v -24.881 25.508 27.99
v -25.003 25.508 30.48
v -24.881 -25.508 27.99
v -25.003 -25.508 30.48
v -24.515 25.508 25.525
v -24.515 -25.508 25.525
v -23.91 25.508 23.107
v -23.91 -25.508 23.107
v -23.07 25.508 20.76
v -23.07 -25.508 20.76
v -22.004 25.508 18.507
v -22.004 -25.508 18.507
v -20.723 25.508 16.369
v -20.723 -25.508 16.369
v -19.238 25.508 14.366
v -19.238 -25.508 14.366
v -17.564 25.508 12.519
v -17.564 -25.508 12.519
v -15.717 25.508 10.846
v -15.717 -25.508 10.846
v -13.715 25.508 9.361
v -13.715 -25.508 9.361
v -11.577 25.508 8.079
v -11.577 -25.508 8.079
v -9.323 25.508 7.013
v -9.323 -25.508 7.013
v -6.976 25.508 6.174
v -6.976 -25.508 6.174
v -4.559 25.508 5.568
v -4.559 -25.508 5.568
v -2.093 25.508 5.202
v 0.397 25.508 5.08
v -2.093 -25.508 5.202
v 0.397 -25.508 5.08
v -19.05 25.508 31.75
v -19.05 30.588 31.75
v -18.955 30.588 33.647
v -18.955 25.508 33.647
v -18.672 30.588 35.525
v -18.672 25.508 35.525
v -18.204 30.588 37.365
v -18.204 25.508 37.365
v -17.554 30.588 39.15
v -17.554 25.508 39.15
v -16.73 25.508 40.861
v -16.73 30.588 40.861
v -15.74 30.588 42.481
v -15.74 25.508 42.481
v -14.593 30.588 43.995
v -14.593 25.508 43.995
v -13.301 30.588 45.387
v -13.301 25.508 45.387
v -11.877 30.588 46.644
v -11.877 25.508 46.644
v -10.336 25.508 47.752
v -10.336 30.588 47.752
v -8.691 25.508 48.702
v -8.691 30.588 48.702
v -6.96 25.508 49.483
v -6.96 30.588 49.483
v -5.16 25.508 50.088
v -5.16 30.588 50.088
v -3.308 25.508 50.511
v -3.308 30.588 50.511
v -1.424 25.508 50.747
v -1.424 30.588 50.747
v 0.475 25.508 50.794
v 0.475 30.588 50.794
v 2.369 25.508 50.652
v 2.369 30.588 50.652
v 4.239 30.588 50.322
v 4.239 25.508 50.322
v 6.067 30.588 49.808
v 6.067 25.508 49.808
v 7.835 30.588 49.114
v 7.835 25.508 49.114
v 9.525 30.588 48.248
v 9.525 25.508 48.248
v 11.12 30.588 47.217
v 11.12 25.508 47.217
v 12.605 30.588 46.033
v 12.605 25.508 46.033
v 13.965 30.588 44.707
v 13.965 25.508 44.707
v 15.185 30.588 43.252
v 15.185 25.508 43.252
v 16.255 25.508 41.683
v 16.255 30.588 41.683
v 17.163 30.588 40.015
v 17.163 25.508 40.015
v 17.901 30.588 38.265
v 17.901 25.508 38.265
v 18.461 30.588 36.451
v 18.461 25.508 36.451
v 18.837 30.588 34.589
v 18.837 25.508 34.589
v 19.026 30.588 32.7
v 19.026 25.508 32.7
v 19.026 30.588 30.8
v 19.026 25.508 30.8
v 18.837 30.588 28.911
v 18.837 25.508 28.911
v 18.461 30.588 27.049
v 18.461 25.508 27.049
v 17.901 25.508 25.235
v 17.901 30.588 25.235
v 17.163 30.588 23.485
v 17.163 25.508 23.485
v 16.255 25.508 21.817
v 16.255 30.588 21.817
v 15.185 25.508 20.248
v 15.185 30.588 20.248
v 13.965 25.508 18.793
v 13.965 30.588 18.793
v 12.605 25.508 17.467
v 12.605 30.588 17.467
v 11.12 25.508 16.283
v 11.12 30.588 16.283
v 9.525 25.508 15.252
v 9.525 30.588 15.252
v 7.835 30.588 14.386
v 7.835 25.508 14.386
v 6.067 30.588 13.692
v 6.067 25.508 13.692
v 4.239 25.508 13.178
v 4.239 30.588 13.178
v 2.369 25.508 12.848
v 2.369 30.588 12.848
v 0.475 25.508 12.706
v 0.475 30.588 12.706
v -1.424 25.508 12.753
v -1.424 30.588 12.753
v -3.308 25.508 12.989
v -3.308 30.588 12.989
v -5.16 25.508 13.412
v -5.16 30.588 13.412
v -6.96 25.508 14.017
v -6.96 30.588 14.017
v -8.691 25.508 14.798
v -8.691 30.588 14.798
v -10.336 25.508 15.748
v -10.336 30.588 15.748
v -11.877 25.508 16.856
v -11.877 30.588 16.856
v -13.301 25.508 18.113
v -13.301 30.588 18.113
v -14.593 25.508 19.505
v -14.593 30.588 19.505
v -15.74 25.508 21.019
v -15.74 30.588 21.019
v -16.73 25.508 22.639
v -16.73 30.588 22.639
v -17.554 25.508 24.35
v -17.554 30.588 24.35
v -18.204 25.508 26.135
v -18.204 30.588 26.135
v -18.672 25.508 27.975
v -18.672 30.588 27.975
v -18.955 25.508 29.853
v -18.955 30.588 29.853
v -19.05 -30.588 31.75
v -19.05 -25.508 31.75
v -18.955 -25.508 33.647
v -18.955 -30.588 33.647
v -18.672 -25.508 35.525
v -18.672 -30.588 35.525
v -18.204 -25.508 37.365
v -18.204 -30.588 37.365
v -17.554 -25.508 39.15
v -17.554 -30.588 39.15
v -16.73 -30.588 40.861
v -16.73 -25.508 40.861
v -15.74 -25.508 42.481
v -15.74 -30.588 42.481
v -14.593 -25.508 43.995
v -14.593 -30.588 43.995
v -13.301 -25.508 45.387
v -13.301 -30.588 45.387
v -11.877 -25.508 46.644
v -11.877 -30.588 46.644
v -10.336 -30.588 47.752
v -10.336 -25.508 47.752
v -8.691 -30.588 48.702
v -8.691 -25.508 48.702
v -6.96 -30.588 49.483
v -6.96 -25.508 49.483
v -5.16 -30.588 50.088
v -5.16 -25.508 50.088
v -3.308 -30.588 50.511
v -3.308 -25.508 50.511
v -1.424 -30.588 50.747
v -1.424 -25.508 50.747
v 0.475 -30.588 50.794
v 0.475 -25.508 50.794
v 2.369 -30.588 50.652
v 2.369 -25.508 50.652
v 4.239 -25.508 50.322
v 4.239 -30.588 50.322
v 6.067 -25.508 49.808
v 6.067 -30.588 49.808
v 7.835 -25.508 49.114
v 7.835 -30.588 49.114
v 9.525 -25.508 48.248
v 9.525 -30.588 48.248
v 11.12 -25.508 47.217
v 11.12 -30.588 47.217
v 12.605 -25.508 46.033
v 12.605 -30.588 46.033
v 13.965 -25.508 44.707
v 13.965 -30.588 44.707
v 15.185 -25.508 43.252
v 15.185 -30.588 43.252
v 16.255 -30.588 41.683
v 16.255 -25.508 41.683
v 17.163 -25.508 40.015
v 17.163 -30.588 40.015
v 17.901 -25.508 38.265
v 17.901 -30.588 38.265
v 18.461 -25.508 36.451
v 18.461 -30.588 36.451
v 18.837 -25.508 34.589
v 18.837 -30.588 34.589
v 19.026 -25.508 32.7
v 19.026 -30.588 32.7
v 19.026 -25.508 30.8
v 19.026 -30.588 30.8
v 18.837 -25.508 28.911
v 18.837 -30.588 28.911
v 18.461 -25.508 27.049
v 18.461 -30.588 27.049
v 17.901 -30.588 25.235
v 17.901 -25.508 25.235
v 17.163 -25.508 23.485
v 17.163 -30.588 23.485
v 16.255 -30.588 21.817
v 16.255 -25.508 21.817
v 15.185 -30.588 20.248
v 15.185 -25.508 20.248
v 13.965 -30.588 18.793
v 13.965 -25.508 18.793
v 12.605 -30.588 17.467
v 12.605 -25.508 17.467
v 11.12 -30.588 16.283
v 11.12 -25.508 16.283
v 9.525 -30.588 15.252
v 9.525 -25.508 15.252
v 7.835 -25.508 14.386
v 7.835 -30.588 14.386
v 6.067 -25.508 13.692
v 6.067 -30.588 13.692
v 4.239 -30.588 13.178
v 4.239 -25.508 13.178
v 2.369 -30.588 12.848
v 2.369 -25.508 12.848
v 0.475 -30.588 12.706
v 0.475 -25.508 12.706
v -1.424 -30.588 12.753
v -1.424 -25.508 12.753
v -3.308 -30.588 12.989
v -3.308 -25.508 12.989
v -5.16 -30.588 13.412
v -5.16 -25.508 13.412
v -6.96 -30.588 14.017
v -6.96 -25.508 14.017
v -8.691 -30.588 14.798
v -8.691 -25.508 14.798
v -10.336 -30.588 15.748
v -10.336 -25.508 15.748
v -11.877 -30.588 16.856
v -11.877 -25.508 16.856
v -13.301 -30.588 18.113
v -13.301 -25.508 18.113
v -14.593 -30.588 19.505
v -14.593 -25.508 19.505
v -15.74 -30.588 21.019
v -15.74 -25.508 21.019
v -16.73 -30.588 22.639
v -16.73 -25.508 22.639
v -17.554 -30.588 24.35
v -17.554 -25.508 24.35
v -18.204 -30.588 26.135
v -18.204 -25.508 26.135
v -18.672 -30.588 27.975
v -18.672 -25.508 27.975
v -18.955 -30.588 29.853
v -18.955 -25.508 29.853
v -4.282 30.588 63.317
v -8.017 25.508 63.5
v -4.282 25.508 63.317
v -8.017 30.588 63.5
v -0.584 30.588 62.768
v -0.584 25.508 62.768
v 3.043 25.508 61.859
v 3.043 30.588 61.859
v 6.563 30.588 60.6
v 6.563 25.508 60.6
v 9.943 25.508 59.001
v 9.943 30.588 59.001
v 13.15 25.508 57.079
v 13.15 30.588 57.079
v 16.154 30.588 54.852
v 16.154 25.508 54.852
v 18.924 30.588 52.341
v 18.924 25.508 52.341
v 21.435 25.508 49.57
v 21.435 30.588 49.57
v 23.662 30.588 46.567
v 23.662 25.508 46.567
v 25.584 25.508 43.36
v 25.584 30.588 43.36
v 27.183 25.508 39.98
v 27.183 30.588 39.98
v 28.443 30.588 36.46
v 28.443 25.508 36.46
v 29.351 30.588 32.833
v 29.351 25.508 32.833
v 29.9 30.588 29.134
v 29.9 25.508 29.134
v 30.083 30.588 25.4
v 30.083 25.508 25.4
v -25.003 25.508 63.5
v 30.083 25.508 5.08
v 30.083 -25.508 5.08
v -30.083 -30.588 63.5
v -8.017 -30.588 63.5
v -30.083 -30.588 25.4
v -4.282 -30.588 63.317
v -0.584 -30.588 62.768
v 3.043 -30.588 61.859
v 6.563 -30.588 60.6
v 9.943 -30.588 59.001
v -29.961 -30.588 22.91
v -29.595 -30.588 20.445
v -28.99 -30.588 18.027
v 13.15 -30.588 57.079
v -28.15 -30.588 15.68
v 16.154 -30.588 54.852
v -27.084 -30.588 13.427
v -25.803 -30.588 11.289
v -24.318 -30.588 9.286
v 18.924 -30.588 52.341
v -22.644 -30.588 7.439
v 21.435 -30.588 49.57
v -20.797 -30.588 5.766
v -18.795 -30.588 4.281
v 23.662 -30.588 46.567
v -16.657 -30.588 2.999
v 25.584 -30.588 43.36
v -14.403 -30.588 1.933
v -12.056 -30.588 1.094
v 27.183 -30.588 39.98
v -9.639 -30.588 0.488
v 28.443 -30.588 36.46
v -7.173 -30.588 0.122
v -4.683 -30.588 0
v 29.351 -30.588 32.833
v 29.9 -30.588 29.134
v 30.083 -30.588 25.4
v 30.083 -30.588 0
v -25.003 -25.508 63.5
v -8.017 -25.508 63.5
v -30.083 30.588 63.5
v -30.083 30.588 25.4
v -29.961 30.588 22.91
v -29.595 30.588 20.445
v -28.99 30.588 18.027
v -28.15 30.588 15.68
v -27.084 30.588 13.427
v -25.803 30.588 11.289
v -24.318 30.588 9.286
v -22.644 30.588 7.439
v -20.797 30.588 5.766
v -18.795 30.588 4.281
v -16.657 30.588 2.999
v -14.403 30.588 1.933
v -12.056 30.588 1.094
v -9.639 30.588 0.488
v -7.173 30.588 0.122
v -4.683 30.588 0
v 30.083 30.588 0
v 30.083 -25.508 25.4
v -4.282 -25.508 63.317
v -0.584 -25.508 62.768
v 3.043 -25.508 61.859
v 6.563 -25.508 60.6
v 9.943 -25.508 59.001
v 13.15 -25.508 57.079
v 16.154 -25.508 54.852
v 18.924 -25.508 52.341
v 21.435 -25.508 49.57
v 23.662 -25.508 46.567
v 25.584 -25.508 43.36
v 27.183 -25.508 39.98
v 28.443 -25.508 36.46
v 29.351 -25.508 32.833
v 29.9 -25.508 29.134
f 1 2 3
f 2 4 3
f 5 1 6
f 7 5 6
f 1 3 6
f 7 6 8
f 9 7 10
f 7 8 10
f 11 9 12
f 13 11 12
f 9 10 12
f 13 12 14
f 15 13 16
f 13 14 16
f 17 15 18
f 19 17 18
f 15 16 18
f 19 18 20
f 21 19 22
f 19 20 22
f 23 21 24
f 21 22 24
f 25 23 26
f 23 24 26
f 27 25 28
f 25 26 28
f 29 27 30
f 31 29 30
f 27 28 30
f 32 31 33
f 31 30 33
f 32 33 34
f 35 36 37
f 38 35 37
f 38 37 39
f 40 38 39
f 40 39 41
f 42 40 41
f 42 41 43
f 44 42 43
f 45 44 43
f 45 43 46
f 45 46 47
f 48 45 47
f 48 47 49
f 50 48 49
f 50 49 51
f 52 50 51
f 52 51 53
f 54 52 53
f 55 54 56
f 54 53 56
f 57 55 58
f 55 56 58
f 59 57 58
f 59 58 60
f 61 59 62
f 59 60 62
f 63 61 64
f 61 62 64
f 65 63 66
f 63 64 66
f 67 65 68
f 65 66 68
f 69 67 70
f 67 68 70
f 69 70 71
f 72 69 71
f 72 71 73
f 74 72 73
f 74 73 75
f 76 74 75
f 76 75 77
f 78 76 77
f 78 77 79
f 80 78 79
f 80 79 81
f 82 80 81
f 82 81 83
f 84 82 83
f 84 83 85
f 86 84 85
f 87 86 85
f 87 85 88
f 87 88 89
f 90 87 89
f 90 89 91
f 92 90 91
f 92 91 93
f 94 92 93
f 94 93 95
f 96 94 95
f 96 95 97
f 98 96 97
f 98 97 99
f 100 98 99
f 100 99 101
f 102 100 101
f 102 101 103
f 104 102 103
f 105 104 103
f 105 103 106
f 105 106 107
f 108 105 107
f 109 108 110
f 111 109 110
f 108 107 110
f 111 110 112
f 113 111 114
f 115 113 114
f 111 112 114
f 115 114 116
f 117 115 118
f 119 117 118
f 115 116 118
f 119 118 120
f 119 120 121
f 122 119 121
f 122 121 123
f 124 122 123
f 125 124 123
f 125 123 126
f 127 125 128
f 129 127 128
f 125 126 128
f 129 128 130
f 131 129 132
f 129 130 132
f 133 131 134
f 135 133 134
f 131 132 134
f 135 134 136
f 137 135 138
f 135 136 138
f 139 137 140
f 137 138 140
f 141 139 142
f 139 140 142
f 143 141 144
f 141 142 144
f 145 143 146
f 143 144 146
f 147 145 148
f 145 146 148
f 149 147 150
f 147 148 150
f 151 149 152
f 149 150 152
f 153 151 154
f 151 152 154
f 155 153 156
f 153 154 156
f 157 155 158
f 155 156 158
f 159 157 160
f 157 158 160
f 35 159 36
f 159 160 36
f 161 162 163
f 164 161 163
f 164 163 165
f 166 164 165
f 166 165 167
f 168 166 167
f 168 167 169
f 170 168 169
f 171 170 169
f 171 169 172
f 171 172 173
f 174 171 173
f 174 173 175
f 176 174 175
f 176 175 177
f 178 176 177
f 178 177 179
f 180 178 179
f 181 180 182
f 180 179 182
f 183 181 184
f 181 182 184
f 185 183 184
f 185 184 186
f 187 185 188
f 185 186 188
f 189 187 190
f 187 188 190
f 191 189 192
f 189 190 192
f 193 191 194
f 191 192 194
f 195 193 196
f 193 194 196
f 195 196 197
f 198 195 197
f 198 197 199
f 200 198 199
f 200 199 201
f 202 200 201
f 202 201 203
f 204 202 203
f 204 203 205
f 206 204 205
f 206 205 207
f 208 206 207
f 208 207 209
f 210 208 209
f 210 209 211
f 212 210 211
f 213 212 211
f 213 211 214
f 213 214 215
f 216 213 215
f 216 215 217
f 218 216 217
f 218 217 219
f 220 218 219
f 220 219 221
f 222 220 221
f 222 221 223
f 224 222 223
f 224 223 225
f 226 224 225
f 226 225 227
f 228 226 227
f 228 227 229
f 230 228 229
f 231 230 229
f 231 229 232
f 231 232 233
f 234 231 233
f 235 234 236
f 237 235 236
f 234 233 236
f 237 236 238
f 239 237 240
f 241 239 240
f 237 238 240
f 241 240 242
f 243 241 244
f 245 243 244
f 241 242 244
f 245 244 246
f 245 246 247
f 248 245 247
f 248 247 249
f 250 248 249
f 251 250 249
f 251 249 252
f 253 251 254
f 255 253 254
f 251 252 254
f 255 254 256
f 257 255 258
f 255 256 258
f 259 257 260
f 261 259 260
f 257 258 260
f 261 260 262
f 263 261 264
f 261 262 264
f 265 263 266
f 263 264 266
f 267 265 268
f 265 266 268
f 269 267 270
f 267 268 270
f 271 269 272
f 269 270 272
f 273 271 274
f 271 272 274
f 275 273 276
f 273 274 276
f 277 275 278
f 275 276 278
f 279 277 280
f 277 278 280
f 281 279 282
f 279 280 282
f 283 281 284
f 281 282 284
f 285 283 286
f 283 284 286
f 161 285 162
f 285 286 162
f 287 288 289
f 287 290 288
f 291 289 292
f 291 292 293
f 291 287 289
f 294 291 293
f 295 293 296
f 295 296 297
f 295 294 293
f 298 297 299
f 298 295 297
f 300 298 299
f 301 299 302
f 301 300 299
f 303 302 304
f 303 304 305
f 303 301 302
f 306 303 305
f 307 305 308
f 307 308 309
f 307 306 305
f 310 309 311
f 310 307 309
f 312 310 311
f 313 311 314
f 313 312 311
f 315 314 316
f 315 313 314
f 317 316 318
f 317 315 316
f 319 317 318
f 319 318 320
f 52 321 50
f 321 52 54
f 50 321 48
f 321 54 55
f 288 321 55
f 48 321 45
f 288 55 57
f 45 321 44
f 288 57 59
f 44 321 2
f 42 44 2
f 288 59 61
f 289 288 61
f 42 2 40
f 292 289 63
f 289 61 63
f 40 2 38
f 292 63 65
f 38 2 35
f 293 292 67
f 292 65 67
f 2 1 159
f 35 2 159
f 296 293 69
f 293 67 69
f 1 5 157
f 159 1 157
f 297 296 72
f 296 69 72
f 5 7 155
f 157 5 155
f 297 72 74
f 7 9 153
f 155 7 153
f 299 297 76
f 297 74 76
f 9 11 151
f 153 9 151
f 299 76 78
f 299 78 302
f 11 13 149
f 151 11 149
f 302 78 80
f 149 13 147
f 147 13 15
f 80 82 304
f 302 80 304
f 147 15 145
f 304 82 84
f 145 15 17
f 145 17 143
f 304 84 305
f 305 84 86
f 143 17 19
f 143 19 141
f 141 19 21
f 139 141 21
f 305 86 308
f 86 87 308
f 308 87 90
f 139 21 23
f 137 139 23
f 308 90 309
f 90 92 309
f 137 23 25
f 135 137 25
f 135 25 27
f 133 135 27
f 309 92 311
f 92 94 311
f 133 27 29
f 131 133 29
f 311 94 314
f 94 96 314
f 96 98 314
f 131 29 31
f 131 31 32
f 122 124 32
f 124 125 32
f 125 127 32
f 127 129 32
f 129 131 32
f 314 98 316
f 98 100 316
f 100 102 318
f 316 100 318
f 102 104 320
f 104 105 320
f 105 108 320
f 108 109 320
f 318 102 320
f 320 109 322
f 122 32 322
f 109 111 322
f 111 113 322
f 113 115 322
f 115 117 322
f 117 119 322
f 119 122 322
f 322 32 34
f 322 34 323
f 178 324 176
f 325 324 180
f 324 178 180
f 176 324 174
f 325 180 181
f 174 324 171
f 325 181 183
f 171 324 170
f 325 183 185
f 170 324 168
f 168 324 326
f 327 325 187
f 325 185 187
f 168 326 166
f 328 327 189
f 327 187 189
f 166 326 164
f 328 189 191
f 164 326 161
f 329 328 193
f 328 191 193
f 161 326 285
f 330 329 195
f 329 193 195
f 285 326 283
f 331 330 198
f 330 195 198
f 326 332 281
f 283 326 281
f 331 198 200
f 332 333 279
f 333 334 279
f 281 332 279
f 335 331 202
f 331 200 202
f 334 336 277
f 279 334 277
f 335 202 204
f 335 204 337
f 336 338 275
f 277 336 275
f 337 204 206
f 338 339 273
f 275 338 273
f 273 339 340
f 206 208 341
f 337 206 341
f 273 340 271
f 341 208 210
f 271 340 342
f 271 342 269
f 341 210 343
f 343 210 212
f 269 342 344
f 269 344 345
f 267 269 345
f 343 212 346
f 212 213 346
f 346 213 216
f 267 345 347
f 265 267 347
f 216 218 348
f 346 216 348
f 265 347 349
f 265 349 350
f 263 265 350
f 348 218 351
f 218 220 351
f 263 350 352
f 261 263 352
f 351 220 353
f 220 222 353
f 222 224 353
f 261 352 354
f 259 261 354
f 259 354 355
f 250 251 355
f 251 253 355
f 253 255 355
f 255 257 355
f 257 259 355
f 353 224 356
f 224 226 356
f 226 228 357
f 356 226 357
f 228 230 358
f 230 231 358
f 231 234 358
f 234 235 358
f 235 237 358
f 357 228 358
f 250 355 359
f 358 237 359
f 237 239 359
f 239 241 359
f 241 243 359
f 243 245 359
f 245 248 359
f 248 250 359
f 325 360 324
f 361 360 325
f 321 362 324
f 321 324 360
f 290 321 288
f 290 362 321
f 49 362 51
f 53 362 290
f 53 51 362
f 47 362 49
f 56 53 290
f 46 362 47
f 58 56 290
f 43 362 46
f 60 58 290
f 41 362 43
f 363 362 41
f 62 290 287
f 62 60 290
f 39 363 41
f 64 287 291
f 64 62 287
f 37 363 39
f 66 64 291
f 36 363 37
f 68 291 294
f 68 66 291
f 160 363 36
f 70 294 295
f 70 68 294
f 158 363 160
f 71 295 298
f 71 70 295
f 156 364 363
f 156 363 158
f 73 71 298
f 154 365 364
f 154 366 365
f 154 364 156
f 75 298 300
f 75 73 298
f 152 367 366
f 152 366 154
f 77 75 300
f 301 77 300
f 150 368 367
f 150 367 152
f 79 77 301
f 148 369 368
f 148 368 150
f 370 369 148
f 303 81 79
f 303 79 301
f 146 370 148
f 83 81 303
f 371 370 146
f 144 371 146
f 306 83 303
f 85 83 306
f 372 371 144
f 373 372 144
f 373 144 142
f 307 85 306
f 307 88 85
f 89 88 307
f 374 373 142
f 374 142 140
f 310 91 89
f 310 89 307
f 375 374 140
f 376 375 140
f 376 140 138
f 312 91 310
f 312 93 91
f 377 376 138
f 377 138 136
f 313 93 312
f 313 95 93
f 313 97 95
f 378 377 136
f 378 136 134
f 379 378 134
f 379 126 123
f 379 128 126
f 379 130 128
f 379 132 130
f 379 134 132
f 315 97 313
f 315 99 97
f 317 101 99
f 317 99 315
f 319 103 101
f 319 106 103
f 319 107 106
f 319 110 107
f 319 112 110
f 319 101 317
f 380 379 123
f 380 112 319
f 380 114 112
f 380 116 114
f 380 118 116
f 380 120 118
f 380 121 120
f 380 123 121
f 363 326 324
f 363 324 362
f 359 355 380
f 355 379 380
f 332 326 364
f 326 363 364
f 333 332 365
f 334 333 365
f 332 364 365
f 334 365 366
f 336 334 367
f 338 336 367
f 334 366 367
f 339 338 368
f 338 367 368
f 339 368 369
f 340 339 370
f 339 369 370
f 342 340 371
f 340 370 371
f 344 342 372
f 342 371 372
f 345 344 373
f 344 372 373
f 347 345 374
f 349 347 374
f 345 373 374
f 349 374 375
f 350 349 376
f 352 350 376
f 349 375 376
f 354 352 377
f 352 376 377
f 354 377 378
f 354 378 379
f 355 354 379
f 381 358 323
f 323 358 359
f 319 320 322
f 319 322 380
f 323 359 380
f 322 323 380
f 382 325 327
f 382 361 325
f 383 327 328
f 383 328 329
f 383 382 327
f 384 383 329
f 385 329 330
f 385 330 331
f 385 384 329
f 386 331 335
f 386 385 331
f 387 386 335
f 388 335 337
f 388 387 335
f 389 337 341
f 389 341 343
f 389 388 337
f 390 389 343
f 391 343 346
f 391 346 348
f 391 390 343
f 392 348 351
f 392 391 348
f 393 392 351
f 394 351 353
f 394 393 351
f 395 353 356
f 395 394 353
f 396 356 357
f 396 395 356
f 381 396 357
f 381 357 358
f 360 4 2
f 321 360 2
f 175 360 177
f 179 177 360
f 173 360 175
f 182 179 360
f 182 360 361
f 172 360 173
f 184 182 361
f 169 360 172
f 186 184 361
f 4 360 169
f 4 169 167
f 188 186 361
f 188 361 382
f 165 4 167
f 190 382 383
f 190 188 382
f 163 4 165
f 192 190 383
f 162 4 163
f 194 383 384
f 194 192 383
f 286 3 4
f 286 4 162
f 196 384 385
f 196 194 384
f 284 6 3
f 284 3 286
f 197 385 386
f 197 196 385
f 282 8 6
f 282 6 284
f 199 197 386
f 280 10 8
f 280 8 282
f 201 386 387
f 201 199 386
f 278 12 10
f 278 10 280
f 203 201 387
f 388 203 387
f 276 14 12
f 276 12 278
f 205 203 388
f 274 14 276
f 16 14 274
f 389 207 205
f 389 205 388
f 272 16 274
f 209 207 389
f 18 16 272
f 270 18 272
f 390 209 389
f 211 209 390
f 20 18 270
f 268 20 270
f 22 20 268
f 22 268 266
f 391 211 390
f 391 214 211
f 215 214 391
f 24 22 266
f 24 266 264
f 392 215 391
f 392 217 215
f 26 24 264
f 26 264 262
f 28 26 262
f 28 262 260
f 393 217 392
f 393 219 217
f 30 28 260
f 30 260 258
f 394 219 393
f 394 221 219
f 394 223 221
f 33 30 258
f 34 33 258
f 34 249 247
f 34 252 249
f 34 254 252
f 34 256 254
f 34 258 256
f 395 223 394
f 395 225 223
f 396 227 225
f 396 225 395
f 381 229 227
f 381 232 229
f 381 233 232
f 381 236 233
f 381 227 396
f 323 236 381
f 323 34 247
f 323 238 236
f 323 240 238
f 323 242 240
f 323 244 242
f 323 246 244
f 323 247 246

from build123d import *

# Parameters (mm, degrees)
F0_W     = 60.1664371789
F0_H     = 61.1762590706
F1_DEPTH = 63.5
F2_T     = -5.08
F3_R     = 19.05
F4_DEPTH = 61.1762590706
F5_R     = 38.1
F7_R     = 25.4


# Not quite as in the source:
# - a feature of the source that left no trace in its solid (it failed there, or was rolled back) is left out


with BuildPart() as f1:
    # F0 (on Top) → F1 (new body)
    with BuildSketch(Plane.XY):
        Rectangle(F0_W, F0_H)
    extrude(amount=F1_DEPTH)

    # F2
    f2_openings = [f1.faces().sort_by_distance(p)[0] for p in [
        (30.083219, 0, 31.75),
        (0, 0, 63.5),
    ]]
    offset(amount=F2_T, openings=f2_openings)

    # F3 (on face) → F4 (cut, through all)
    with BuildSketch(Plane(origin=(0, 30.5881295353, 0), x_dir=(-1, 0, 0), z_dir=(0, 1, 0))):
        with Locations((0, 31.75)):
            Circle(F3_R)
    extrude(amount=-F4_DEPTH, mode=Mode.SUBTRACT)

    # F5
    f5_edges = [f1.edges().sort_by_distance(p)[0] for p in [
        (30.083219, -28.04813, 63.5),
        (30.083219, 28.04813, 63.5),
    ]]
    fillet(f5_edges, radius=F5_R)

    # F7
    f7_edges = [f1.edges().sort_by_distance(p)[0] for p in [
        (-30.083219, 0, 0),
        (-25.003219, 0, 5.08),
    ]]
    fillet(f7_edges, radius=F7_R)


solid = f1.part
